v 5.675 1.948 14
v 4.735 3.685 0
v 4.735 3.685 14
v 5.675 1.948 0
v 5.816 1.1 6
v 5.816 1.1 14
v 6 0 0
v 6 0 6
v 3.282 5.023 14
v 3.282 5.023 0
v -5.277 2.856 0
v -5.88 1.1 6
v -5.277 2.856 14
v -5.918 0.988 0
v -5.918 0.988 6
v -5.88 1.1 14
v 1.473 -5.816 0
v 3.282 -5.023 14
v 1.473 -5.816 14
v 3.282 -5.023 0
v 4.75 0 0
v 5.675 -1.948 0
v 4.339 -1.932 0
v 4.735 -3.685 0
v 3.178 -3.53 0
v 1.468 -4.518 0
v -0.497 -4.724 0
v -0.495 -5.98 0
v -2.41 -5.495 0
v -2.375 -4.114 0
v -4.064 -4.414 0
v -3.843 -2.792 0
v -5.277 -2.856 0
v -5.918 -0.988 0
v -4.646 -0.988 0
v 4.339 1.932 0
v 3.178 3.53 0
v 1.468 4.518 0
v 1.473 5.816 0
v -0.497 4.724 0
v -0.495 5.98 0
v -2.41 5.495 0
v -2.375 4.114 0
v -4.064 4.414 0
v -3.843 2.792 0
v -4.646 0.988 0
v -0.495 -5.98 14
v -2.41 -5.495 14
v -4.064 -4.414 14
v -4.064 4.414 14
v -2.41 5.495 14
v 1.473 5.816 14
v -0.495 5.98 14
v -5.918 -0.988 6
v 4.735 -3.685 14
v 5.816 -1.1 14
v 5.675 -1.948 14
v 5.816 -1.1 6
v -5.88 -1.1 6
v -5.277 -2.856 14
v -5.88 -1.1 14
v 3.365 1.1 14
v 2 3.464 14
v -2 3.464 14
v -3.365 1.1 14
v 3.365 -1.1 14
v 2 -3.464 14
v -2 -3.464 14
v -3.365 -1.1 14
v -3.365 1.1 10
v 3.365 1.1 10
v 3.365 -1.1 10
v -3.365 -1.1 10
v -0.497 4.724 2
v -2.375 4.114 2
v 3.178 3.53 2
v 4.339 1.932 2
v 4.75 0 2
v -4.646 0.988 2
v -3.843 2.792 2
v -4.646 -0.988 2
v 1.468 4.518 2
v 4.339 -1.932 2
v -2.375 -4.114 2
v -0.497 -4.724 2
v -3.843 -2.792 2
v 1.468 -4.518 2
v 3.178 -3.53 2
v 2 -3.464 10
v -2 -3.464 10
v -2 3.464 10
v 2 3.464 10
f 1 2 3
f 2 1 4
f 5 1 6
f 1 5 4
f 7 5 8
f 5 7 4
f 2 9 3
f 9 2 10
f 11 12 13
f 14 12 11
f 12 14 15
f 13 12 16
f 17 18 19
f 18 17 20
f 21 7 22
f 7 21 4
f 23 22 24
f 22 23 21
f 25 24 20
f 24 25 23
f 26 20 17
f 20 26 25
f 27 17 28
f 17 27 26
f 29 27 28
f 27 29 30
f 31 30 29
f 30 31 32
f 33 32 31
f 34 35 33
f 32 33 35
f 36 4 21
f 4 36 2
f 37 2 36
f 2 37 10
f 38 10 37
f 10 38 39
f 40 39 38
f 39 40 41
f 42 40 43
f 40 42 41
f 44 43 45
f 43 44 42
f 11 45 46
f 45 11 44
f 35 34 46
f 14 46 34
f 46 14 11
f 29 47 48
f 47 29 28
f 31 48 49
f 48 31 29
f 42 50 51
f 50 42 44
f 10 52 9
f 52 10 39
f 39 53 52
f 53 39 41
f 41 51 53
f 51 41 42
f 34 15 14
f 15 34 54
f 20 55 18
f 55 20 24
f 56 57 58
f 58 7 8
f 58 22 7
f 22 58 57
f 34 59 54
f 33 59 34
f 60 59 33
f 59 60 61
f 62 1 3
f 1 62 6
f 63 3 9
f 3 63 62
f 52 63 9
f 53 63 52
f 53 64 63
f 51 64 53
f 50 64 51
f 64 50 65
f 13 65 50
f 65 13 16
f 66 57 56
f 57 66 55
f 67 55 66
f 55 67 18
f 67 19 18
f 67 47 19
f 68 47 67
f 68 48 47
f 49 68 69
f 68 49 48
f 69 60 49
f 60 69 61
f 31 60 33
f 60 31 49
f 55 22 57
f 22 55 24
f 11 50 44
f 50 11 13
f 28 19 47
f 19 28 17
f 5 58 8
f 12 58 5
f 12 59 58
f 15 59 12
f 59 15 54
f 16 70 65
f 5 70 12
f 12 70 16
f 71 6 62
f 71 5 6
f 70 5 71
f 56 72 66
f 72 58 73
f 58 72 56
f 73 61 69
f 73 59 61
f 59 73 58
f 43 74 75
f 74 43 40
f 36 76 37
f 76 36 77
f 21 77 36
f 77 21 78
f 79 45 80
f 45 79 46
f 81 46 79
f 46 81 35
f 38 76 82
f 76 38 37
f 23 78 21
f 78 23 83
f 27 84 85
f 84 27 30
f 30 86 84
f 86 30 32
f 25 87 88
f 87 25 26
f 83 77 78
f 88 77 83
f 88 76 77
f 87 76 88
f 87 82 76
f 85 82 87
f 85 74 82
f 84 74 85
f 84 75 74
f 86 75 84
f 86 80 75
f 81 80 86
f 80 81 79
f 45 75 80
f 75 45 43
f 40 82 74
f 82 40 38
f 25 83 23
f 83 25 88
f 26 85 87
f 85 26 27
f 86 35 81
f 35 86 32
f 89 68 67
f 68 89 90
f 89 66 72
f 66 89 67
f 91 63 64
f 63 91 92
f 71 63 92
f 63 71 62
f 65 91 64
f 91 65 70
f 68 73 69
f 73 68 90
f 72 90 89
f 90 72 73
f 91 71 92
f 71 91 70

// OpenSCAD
    difference() {
        cylinder(h=14, r=6, center = false);
        translate([-6,-1.1,6]){
            cube([12,2.2,10], center = false);
        }
        translate([0,0,-1]){
            cylinder(h=3, r=4.75, center=false);
        }
        translate([0,0,10]){
            cylinder(h=5, r=4, center=false, $fn=6);
        }
    }
